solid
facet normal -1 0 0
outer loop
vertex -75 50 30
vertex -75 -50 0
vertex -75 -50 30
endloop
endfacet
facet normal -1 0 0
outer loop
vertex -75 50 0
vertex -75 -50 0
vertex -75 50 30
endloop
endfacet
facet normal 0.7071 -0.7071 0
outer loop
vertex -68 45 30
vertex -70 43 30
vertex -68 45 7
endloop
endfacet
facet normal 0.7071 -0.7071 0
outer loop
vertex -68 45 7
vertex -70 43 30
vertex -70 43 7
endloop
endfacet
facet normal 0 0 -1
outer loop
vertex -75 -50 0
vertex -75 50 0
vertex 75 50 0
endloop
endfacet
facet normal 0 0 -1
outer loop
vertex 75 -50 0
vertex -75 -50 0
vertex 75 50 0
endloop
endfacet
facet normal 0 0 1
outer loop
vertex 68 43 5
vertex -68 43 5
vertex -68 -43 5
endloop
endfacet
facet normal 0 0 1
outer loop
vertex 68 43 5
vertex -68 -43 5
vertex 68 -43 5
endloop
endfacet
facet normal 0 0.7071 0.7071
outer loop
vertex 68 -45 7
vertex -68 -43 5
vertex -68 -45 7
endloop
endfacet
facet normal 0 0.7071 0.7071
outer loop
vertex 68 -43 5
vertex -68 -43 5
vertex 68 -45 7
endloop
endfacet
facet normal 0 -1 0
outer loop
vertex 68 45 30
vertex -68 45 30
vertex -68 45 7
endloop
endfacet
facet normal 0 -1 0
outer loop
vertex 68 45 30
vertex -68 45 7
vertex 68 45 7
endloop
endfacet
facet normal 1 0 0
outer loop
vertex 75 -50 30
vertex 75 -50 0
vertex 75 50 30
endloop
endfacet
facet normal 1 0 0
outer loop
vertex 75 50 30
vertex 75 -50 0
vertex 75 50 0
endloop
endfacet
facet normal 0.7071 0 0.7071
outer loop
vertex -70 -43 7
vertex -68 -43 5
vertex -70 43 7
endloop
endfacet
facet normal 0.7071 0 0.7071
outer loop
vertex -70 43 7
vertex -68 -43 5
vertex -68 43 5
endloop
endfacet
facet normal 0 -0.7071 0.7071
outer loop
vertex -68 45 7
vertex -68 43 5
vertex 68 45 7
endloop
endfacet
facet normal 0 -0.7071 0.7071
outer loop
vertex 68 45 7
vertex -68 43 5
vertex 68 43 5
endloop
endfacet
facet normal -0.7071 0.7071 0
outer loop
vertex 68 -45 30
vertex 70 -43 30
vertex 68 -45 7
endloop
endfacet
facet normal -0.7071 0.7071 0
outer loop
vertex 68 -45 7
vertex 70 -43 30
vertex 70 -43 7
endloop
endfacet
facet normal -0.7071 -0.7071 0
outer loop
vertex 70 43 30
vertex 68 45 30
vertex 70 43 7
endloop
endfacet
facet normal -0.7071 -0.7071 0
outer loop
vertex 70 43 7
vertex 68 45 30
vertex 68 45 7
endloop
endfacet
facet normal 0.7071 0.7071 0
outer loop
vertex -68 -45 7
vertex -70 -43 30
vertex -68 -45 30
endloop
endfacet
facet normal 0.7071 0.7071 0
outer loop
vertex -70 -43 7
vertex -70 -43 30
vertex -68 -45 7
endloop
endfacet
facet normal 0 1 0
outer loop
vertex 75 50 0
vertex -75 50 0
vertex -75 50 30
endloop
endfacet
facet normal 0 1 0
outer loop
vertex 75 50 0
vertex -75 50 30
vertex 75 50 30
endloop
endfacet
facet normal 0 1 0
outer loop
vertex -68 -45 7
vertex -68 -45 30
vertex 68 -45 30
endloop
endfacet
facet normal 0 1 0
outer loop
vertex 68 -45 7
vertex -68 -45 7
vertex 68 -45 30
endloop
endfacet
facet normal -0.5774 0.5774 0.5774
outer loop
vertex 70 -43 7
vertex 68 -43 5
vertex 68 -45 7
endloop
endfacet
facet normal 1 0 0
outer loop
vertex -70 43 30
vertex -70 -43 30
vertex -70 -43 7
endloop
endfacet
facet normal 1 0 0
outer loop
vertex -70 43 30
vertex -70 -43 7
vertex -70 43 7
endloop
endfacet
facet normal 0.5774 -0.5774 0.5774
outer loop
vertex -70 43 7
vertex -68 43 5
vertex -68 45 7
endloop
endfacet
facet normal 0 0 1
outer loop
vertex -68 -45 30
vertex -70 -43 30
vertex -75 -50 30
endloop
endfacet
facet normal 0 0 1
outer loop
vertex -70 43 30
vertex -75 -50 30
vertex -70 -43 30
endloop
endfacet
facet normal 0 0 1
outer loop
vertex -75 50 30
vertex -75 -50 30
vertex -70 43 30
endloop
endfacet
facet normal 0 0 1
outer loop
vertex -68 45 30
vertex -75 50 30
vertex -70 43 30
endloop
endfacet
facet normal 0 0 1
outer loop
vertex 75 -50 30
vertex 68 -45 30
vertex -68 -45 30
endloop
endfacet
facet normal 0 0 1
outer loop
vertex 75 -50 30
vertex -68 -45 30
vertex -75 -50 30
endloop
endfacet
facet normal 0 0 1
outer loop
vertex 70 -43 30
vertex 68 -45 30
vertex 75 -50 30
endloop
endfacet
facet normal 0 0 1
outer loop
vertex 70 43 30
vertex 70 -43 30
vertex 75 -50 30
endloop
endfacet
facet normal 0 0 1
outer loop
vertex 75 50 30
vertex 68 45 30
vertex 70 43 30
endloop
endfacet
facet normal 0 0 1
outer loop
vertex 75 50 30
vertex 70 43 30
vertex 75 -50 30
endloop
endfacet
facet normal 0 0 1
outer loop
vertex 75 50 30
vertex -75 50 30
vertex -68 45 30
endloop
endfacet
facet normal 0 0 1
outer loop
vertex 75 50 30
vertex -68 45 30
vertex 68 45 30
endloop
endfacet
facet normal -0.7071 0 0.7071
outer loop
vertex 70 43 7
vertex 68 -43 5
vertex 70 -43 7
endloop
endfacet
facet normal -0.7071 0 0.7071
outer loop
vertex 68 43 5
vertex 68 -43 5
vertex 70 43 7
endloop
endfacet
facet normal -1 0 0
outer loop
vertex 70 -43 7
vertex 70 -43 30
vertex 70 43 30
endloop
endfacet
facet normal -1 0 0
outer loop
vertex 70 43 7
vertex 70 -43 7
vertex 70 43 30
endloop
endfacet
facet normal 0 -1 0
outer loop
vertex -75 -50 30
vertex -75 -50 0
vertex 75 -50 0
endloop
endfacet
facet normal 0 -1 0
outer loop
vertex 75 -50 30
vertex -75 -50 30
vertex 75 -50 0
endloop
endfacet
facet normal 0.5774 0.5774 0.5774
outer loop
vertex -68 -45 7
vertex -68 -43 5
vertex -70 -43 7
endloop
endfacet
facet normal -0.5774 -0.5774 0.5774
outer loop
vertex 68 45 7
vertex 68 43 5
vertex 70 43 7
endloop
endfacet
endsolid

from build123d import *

# Parameters (mm, degrees)
F0_W     = 150
F0_H     = 100
F1_DEPTH = 30
F2_W     = 140
F2_H     = 90
F3_DEPTH = 25
F4_SIZE  = 2


with BuildPart() as f1:
    # F0 (on Top) → F1 (new body)
    with BuildSketch(Plane.XY):
        Rectangle(F0_W, F0_H)
    extrude(amount=F1_DEPTH)

    # F2 (on face) → F3 (cut)
    with BuildSketch(Plane.XY.offset(30)):
        Rectangle(F2_W, F2_H)
    extrude(amount=-F3_DEPTH, mode=Mode.SUBTRACT)

    # F4
    f4_edges = [f1.edges().sort_by_distance(p)[0] for p in [
        (-70, 0, 5),
        (0, -45, 5),
        (70, 0, 5),
        (0, 45, 5),
        (-70, 45, 17.5),
        (70, 45, 17.5),
        (70, -45, 17.5),
        (-70, -45, 17.5),
    ]]
    chamfer(f4_edges, length=F4_SIZE)


solid = f1.part
